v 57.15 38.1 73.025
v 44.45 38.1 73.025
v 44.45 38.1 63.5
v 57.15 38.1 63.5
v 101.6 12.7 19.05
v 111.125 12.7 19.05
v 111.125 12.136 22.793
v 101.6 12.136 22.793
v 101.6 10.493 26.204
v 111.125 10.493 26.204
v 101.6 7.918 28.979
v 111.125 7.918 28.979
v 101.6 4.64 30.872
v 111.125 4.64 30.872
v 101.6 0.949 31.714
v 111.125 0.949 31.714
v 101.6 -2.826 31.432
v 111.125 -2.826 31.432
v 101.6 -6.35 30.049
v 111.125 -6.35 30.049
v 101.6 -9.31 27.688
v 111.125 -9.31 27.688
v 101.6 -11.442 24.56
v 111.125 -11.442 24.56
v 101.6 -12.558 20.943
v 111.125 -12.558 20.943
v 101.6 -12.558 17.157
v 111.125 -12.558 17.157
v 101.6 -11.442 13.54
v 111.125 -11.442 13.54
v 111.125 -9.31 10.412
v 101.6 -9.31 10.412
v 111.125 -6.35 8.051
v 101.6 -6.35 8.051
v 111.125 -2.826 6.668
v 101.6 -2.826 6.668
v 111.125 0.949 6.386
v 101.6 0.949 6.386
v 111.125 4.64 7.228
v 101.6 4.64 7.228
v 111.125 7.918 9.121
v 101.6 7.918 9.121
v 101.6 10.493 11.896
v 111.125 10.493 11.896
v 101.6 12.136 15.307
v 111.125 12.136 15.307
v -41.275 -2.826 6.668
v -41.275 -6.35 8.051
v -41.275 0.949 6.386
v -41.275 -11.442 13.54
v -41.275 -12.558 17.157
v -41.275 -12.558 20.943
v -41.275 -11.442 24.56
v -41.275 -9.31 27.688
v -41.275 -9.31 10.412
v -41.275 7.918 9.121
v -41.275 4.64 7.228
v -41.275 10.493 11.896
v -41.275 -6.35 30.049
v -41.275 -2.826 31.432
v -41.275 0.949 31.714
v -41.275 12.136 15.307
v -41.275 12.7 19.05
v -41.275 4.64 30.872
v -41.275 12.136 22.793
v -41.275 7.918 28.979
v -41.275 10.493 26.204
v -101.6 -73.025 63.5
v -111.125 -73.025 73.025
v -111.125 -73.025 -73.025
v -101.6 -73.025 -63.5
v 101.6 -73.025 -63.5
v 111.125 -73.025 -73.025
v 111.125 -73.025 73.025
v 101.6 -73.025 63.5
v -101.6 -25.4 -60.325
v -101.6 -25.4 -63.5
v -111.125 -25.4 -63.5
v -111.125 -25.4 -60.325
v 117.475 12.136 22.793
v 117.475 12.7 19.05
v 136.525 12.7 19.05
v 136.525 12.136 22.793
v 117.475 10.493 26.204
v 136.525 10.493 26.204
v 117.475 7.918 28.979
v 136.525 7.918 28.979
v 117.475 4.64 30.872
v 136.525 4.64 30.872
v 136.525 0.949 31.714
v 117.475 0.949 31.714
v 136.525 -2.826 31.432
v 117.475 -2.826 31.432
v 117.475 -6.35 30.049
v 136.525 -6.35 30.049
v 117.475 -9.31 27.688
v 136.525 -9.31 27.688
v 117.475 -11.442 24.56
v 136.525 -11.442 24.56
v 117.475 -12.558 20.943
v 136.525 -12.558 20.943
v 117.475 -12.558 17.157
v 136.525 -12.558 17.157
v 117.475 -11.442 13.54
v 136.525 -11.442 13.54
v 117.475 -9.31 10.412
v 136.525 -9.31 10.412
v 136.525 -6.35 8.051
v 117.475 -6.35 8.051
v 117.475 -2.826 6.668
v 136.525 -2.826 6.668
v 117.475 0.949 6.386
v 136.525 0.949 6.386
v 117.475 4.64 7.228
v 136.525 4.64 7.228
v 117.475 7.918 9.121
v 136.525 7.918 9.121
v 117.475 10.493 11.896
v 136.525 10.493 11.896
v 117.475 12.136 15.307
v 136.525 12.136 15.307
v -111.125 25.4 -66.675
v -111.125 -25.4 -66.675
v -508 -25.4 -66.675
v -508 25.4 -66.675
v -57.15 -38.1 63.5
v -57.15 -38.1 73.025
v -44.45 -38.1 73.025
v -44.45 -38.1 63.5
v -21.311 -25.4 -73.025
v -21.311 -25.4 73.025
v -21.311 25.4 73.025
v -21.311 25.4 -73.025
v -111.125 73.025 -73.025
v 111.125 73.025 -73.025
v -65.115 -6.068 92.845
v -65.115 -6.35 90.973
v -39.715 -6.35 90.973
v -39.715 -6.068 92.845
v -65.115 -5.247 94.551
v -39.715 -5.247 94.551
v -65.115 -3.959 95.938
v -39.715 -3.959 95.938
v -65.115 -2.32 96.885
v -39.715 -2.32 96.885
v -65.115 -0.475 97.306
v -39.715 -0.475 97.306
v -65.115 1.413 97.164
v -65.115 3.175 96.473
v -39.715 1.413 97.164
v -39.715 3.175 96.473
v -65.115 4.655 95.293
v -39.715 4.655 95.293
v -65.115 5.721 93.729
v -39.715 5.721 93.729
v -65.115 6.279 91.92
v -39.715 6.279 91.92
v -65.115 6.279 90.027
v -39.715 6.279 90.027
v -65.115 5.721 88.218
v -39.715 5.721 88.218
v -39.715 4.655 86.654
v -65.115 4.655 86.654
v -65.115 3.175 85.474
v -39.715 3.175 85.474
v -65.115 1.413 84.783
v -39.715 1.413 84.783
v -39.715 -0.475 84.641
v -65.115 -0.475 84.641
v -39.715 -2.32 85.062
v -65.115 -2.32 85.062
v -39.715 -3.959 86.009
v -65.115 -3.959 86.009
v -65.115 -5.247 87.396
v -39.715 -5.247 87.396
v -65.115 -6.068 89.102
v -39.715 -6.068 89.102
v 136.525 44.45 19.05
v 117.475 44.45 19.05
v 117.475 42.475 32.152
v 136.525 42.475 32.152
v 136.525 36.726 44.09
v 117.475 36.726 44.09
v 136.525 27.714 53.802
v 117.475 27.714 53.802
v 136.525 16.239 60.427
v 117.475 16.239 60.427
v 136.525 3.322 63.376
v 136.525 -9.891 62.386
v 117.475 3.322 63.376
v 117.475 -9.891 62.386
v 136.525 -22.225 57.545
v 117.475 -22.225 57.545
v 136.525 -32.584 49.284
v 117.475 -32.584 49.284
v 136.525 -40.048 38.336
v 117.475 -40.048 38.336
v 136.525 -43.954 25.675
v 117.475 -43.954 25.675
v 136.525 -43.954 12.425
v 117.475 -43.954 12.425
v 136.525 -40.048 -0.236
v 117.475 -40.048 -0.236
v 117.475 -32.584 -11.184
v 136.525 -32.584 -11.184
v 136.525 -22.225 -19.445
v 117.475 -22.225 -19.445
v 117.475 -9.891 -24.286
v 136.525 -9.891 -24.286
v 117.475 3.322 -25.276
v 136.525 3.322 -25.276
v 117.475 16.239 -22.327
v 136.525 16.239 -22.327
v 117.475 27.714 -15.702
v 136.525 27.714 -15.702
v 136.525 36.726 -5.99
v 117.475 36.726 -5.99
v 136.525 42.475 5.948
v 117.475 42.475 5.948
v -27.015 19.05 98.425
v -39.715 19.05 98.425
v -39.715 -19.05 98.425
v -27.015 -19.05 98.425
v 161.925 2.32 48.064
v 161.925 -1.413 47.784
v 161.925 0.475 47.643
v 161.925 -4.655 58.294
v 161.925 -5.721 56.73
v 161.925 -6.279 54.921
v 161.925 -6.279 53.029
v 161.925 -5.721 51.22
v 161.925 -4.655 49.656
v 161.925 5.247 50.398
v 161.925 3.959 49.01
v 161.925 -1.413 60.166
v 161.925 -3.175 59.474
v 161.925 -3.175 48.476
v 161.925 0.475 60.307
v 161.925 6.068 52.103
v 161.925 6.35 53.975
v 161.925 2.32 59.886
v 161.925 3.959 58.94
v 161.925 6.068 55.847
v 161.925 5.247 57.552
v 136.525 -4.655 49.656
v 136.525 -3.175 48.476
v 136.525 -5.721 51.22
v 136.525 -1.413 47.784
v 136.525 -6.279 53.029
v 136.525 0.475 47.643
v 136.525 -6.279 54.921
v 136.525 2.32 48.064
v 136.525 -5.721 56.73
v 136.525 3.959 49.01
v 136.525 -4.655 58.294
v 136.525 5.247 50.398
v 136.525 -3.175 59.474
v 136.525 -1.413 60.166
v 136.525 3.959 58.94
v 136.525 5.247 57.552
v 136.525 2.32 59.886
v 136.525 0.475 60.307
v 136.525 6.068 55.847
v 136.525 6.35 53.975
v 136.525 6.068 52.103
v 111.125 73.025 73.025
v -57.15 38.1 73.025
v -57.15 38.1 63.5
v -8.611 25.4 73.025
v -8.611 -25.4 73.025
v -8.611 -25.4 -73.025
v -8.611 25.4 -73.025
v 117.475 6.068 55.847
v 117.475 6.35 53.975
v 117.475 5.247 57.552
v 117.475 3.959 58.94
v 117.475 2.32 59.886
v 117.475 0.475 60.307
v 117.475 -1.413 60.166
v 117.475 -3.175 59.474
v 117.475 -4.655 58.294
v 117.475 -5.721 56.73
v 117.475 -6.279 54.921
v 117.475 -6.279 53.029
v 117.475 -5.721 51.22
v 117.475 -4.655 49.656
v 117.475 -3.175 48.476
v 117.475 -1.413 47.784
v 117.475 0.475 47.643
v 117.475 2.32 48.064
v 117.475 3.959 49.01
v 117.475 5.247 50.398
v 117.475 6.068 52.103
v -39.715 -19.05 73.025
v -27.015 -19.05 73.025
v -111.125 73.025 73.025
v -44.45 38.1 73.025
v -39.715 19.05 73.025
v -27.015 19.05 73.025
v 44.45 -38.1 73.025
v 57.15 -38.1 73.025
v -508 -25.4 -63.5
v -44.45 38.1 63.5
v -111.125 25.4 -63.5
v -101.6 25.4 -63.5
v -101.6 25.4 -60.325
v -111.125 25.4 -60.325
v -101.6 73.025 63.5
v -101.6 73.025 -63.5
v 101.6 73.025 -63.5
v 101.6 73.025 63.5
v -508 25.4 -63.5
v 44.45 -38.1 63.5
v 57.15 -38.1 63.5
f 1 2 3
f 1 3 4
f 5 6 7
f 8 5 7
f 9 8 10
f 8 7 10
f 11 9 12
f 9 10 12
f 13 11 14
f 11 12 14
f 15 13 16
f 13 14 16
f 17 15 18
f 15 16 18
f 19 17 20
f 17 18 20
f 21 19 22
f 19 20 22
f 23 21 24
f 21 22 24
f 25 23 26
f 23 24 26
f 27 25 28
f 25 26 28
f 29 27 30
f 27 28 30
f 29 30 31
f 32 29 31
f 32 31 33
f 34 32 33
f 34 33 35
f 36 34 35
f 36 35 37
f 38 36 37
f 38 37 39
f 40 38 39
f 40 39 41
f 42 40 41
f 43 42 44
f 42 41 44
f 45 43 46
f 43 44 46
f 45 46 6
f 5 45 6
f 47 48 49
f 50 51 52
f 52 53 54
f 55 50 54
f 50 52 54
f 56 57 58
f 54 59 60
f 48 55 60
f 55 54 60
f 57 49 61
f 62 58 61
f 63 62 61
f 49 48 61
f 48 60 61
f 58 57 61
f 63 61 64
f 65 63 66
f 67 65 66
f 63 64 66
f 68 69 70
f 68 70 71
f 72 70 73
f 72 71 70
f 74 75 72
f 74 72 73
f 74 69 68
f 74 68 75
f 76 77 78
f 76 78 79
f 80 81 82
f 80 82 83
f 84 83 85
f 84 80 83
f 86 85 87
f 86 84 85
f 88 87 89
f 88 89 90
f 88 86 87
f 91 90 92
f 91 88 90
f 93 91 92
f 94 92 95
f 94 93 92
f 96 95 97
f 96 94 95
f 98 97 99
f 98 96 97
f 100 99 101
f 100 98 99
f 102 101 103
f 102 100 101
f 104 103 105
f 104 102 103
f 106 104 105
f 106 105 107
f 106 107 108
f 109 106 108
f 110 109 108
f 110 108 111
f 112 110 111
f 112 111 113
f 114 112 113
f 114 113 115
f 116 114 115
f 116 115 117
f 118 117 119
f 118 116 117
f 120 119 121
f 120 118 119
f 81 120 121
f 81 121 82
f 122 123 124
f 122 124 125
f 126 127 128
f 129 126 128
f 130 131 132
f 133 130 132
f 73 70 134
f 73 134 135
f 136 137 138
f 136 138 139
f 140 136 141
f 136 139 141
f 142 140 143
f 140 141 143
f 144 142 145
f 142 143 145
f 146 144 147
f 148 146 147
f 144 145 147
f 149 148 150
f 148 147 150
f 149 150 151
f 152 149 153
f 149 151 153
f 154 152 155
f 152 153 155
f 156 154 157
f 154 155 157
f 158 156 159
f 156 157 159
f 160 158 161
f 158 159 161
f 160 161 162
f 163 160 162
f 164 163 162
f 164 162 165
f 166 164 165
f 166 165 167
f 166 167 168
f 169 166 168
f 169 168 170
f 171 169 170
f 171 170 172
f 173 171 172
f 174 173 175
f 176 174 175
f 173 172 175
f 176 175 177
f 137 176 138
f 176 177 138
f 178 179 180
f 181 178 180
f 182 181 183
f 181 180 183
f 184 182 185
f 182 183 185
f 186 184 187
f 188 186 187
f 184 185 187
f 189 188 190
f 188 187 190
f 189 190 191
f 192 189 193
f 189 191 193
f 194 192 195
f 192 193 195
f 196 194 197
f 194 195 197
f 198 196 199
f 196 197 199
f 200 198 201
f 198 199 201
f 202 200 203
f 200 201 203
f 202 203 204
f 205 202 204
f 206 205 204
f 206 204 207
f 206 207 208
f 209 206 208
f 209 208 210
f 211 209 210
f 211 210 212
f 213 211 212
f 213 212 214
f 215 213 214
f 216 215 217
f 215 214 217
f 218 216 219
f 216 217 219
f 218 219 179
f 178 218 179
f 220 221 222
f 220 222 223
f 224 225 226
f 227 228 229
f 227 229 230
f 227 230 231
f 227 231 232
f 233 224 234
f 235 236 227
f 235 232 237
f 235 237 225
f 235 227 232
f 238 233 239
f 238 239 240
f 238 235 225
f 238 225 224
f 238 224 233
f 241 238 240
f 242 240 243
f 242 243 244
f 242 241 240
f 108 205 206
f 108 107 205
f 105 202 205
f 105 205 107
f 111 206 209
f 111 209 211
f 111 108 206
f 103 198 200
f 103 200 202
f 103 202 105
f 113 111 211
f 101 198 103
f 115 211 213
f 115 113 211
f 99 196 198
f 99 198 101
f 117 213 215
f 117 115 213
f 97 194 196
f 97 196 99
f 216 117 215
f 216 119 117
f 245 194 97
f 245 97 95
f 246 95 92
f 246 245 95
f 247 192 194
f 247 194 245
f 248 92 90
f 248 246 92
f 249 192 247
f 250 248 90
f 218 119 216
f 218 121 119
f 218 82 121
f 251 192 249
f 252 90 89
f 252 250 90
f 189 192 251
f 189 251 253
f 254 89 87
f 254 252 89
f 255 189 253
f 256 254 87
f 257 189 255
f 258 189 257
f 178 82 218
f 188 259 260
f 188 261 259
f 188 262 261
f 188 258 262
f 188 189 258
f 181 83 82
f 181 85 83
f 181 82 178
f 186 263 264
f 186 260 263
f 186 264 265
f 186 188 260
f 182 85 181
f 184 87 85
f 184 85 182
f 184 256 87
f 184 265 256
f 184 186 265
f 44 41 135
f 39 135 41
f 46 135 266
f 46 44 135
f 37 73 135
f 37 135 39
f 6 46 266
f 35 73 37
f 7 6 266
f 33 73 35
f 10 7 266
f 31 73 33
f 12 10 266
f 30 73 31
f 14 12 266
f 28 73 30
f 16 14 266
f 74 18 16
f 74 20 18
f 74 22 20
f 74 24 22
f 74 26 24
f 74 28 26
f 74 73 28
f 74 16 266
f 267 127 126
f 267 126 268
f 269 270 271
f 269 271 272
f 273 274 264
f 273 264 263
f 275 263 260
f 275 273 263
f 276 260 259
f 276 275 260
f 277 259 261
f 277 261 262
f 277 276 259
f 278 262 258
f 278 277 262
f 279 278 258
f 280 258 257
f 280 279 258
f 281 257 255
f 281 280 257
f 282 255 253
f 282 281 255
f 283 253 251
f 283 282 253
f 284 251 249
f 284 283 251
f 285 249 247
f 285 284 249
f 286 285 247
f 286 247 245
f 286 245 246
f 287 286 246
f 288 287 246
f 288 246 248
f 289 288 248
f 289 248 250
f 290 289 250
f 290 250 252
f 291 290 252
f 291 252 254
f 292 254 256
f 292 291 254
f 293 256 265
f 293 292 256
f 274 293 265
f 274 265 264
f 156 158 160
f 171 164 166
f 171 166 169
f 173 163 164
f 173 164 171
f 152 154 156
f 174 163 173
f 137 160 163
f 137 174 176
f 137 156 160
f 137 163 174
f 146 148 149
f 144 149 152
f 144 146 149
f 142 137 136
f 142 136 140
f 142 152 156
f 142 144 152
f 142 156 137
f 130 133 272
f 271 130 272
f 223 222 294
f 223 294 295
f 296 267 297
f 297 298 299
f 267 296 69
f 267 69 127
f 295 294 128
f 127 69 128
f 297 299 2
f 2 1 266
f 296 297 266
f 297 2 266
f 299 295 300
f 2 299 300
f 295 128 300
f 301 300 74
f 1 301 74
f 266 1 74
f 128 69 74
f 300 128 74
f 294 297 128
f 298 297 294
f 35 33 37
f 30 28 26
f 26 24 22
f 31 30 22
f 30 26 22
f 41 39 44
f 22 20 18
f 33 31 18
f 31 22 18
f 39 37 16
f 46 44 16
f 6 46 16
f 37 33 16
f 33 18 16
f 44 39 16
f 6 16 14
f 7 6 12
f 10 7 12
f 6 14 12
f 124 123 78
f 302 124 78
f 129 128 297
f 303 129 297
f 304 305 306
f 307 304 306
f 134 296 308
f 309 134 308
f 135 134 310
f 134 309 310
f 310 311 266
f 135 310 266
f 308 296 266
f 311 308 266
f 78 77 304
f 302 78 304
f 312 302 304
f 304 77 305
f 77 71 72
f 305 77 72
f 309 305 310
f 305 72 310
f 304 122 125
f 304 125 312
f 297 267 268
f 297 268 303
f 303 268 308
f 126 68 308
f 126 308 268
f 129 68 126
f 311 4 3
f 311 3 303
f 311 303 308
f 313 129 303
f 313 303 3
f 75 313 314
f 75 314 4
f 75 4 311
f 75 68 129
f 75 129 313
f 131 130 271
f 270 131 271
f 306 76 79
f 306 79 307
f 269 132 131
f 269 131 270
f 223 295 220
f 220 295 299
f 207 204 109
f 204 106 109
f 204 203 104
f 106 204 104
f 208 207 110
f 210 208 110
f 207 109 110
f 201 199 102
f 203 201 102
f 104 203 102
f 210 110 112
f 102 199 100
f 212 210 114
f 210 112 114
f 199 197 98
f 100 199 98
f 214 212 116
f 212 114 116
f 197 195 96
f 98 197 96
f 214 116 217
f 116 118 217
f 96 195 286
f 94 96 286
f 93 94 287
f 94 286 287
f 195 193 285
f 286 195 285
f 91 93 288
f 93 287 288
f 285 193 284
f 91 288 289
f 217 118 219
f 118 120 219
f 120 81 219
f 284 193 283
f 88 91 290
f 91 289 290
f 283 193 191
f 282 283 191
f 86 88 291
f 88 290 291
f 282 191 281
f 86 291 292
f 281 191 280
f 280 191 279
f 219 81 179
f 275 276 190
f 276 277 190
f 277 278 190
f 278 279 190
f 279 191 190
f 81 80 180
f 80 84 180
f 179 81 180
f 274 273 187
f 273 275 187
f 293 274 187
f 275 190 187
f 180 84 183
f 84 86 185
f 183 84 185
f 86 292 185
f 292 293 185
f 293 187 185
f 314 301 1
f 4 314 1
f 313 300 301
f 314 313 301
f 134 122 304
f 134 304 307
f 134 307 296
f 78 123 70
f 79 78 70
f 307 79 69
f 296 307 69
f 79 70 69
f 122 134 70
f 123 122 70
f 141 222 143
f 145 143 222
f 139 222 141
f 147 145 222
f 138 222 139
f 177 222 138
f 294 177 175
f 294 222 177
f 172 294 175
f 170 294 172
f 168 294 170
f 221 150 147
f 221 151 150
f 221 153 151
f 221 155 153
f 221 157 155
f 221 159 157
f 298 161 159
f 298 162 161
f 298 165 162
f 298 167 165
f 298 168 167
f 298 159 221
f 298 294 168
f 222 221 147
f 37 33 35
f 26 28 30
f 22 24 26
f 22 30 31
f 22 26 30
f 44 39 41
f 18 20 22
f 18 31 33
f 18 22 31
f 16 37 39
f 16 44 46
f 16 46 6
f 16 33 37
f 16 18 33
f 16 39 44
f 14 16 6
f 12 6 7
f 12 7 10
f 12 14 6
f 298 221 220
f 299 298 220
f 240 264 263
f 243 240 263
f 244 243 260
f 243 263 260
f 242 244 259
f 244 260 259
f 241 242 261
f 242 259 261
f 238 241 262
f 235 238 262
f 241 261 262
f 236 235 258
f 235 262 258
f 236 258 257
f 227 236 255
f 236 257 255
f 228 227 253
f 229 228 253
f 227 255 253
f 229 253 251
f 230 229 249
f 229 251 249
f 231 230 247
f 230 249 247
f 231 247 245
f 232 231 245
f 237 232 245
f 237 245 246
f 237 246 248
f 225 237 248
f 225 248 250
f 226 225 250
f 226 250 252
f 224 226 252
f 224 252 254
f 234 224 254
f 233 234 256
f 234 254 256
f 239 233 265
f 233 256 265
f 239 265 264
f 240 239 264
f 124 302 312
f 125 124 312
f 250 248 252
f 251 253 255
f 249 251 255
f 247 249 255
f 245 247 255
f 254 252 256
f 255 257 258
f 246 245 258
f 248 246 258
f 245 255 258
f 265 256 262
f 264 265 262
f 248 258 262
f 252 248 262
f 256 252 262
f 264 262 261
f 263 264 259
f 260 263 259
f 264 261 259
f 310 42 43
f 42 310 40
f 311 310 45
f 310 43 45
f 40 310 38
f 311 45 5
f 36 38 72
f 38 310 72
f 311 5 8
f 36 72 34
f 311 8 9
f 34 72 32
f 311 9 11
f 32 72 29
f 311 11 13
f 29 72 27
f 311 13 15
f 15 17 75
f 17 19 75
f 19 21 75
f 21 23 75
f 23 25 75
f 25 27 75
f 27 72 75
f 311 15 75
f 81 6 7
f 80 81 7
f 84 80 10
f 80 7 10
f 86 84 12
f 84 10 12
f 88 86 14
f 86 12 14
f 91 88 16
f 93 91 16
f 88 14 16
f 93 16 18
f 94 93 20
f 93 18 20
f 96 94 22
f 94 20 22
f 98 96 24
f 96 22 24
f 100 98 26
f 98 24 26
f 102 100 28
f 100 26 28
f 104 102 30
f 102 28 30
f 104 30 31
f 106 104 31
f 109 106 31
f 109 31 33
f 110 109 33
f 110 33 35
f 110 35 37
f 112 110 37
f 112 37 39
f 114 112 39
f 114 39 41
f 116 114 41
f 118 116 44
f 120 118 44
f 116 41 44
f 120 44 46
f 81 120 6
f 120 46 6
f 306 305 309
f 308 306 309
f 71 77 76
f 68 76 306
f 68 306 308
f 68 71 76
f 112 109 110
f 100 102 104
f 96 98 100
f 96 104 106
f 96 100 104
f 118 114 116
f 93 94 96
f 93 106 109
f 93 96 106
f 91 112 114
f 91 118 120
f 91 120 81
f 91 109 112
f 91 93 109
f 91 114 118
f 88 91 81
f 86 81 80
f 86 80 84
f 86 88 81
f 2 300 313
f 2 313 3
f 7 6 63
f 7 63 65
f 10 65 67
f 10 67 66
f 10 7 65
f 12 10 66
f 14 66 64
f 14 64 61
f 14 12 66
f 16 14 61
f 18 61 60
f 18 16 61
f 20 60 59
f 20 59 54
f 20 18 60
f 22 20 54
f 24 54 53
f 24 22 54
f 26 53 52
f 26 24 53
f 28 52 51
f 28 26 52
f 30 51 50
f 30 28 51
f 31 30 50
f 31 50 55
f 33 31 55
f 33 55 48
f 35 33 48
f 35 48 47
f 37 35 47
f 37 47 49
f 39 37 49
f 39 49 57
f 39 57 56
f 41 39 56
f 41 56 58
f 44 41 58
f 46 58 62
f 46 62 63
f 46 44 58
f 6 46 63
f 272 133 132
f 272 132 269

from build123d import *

# Parameters (mm, degrees)
F0_W      = 222.25
F0_H      = 146.05
F0_W_2    = 203.2
F0_H_2    = 127
F1_DEPTH  = 73.025
F2_W      = 50.8
F2_H      = 6.35
F3_DEPTH  = 25.4
F4_R      = 12.7
F5_DEPTH  = 9.525
F6_R      = 12.7
F7_DEPTH  = 152.4
F8_R      = 12.7
F9_DEPTH  = 6.35
F10_R     = 44.45
F10_R_2   = 12.7
F10_R_3   = 6.35
F11_DEPTH = 19.05
F12_R     = 6.35
F13_DEPTH = 25.4
F14_W     = 12.7
F14_H     = 76.2
F15_DEPTH = 19.05
F16_W     = 12.7
F16_H     = 38.1
F17_DEPTH = 25.4
F18_R     = 6.35
F19_DEPTH = 25.4
F2_H_2    = 3.175
F20_DEPTH = 406.4
F21_W     = 12.7
F21_H     = 50.8
F22_DEPTH = 146.05


with BuildPart() as f1:
    # F0 (on Front) → F1 (new body, symmetric)
    with BuildSketch(Plane.XZ):
        Rectangle(F0_W, F0_H)
        Rectangle(F0_W_2, F0_H_2, mode=Mode.SUBTRACT)
    extrude(amount=F1_DEPTH, both=True)

    # F2 (on face) → F3 (cut)
    with BuildSketch(Plane.YZ.offset(-101.6)):
        with Locations((0, -63.5)):
            Rectangle(F2_W, F2_H)
    extrude(amount=-F3_DEPTH, mode=Mode.SUBTRACT)

    # F4 (on face) → F5 (cut, through all)
    with BuildSketch(Plane.YZ.offset(111.125)):
        with Locations((0, 19.05)):
            Circle(F4_R)
    extrude(amount=-F5_DEPTH, mode=Mode.SUBTRACT)

    # F14 (on face) → F15 (cut)
    with BuildSketch(Plane.XY.offset(73.025)):
        with Locations((-50.8, 0)):
            Rectangle(F14_W, F14_H)
        with Locations((50.8, 0)):
            Rectangle(F14_W, F14_H)
    extrude(amount=-F15_DEPTH, mode=Mode.SUBTRACT)

    # F16 (on face) → F17 (join)
    with BuildSketch(Plane.XY.offset(73.025)):
        with Locations((-33.365164, 0)):
            Rectangle(F16_W, F16_H)
    extrude(amount=F17_DEPTH)

    # F18 (on face) → F19 (join)
    with BuildSketch(Plane(origin=(-39.715164, 0, 0), x_dir=(0, -1, 0), z_dir=(-1, 0, 0))):
        with Locations((0, 90.973456)):
            Circle(F18_R)
    extrude(amount=F19_DEPTH)

    # F2 (on face) → F20 (join)
    with BuildSketch(Plane.YZ.offset(-101.6)):
        with Locations((0, -65.0875)):
            Rectangle(F2_W, F2_H_2)
    extrude(amount=-F20_DEPTH)


with BuildPart() as f7:
    # F6 (on face) → F7 (new body)
    with BuildSketch(Plane.YZ.offset(111.125)):
        with Locations((0, 19.05)):
            Circle(F6_R)
    extrude(amount=-F7_DEPTH)


with BuildPart() as f9:
    # F8 (on face) → F9 (new body)
    with BuildSketch(Plane.YZ.offset(111.125)):
        with Locations((0, 19.05)):
            Circle(F8_R)
    extrude(amount=F9_DEPTH)

    # F10 (on face) → F11 (join)
    with BuildSketch(Plane.YZ.offset(117.475)):
        with Locations((0, 19.05)):
            Circle(F10_R)
        with Locations((0, 19.05)):
            Circle(F10_R_2, mode=Mode.SUBTRACT)
        with Locations((0, 53.975)):
            Circle(F10_R_3, mode=Mode.SUBTRACT)
    extrude(amount=F11_DEPTH)

    # F12 (on face) → F13 (join)
    with BuildSketch(Plane.YZ.offset(136.525)):
        with Locations((0, 53.975)):
            Circle(F12_R)
    extrude(amount=F13_DEPTH)


with BuildPart() as f22:
    # F21 (on face) → F22 (new body)
    with BuildSketch(Plane.XY.offset(73.025)):
        with Locations((-14.961285, 0)):
            Rectangle(F21_W, F21_H)
    extrude(amount=-F22_DEPTH)


solid = Compound([f1.part, f7.part, f9.part, f22.part])
